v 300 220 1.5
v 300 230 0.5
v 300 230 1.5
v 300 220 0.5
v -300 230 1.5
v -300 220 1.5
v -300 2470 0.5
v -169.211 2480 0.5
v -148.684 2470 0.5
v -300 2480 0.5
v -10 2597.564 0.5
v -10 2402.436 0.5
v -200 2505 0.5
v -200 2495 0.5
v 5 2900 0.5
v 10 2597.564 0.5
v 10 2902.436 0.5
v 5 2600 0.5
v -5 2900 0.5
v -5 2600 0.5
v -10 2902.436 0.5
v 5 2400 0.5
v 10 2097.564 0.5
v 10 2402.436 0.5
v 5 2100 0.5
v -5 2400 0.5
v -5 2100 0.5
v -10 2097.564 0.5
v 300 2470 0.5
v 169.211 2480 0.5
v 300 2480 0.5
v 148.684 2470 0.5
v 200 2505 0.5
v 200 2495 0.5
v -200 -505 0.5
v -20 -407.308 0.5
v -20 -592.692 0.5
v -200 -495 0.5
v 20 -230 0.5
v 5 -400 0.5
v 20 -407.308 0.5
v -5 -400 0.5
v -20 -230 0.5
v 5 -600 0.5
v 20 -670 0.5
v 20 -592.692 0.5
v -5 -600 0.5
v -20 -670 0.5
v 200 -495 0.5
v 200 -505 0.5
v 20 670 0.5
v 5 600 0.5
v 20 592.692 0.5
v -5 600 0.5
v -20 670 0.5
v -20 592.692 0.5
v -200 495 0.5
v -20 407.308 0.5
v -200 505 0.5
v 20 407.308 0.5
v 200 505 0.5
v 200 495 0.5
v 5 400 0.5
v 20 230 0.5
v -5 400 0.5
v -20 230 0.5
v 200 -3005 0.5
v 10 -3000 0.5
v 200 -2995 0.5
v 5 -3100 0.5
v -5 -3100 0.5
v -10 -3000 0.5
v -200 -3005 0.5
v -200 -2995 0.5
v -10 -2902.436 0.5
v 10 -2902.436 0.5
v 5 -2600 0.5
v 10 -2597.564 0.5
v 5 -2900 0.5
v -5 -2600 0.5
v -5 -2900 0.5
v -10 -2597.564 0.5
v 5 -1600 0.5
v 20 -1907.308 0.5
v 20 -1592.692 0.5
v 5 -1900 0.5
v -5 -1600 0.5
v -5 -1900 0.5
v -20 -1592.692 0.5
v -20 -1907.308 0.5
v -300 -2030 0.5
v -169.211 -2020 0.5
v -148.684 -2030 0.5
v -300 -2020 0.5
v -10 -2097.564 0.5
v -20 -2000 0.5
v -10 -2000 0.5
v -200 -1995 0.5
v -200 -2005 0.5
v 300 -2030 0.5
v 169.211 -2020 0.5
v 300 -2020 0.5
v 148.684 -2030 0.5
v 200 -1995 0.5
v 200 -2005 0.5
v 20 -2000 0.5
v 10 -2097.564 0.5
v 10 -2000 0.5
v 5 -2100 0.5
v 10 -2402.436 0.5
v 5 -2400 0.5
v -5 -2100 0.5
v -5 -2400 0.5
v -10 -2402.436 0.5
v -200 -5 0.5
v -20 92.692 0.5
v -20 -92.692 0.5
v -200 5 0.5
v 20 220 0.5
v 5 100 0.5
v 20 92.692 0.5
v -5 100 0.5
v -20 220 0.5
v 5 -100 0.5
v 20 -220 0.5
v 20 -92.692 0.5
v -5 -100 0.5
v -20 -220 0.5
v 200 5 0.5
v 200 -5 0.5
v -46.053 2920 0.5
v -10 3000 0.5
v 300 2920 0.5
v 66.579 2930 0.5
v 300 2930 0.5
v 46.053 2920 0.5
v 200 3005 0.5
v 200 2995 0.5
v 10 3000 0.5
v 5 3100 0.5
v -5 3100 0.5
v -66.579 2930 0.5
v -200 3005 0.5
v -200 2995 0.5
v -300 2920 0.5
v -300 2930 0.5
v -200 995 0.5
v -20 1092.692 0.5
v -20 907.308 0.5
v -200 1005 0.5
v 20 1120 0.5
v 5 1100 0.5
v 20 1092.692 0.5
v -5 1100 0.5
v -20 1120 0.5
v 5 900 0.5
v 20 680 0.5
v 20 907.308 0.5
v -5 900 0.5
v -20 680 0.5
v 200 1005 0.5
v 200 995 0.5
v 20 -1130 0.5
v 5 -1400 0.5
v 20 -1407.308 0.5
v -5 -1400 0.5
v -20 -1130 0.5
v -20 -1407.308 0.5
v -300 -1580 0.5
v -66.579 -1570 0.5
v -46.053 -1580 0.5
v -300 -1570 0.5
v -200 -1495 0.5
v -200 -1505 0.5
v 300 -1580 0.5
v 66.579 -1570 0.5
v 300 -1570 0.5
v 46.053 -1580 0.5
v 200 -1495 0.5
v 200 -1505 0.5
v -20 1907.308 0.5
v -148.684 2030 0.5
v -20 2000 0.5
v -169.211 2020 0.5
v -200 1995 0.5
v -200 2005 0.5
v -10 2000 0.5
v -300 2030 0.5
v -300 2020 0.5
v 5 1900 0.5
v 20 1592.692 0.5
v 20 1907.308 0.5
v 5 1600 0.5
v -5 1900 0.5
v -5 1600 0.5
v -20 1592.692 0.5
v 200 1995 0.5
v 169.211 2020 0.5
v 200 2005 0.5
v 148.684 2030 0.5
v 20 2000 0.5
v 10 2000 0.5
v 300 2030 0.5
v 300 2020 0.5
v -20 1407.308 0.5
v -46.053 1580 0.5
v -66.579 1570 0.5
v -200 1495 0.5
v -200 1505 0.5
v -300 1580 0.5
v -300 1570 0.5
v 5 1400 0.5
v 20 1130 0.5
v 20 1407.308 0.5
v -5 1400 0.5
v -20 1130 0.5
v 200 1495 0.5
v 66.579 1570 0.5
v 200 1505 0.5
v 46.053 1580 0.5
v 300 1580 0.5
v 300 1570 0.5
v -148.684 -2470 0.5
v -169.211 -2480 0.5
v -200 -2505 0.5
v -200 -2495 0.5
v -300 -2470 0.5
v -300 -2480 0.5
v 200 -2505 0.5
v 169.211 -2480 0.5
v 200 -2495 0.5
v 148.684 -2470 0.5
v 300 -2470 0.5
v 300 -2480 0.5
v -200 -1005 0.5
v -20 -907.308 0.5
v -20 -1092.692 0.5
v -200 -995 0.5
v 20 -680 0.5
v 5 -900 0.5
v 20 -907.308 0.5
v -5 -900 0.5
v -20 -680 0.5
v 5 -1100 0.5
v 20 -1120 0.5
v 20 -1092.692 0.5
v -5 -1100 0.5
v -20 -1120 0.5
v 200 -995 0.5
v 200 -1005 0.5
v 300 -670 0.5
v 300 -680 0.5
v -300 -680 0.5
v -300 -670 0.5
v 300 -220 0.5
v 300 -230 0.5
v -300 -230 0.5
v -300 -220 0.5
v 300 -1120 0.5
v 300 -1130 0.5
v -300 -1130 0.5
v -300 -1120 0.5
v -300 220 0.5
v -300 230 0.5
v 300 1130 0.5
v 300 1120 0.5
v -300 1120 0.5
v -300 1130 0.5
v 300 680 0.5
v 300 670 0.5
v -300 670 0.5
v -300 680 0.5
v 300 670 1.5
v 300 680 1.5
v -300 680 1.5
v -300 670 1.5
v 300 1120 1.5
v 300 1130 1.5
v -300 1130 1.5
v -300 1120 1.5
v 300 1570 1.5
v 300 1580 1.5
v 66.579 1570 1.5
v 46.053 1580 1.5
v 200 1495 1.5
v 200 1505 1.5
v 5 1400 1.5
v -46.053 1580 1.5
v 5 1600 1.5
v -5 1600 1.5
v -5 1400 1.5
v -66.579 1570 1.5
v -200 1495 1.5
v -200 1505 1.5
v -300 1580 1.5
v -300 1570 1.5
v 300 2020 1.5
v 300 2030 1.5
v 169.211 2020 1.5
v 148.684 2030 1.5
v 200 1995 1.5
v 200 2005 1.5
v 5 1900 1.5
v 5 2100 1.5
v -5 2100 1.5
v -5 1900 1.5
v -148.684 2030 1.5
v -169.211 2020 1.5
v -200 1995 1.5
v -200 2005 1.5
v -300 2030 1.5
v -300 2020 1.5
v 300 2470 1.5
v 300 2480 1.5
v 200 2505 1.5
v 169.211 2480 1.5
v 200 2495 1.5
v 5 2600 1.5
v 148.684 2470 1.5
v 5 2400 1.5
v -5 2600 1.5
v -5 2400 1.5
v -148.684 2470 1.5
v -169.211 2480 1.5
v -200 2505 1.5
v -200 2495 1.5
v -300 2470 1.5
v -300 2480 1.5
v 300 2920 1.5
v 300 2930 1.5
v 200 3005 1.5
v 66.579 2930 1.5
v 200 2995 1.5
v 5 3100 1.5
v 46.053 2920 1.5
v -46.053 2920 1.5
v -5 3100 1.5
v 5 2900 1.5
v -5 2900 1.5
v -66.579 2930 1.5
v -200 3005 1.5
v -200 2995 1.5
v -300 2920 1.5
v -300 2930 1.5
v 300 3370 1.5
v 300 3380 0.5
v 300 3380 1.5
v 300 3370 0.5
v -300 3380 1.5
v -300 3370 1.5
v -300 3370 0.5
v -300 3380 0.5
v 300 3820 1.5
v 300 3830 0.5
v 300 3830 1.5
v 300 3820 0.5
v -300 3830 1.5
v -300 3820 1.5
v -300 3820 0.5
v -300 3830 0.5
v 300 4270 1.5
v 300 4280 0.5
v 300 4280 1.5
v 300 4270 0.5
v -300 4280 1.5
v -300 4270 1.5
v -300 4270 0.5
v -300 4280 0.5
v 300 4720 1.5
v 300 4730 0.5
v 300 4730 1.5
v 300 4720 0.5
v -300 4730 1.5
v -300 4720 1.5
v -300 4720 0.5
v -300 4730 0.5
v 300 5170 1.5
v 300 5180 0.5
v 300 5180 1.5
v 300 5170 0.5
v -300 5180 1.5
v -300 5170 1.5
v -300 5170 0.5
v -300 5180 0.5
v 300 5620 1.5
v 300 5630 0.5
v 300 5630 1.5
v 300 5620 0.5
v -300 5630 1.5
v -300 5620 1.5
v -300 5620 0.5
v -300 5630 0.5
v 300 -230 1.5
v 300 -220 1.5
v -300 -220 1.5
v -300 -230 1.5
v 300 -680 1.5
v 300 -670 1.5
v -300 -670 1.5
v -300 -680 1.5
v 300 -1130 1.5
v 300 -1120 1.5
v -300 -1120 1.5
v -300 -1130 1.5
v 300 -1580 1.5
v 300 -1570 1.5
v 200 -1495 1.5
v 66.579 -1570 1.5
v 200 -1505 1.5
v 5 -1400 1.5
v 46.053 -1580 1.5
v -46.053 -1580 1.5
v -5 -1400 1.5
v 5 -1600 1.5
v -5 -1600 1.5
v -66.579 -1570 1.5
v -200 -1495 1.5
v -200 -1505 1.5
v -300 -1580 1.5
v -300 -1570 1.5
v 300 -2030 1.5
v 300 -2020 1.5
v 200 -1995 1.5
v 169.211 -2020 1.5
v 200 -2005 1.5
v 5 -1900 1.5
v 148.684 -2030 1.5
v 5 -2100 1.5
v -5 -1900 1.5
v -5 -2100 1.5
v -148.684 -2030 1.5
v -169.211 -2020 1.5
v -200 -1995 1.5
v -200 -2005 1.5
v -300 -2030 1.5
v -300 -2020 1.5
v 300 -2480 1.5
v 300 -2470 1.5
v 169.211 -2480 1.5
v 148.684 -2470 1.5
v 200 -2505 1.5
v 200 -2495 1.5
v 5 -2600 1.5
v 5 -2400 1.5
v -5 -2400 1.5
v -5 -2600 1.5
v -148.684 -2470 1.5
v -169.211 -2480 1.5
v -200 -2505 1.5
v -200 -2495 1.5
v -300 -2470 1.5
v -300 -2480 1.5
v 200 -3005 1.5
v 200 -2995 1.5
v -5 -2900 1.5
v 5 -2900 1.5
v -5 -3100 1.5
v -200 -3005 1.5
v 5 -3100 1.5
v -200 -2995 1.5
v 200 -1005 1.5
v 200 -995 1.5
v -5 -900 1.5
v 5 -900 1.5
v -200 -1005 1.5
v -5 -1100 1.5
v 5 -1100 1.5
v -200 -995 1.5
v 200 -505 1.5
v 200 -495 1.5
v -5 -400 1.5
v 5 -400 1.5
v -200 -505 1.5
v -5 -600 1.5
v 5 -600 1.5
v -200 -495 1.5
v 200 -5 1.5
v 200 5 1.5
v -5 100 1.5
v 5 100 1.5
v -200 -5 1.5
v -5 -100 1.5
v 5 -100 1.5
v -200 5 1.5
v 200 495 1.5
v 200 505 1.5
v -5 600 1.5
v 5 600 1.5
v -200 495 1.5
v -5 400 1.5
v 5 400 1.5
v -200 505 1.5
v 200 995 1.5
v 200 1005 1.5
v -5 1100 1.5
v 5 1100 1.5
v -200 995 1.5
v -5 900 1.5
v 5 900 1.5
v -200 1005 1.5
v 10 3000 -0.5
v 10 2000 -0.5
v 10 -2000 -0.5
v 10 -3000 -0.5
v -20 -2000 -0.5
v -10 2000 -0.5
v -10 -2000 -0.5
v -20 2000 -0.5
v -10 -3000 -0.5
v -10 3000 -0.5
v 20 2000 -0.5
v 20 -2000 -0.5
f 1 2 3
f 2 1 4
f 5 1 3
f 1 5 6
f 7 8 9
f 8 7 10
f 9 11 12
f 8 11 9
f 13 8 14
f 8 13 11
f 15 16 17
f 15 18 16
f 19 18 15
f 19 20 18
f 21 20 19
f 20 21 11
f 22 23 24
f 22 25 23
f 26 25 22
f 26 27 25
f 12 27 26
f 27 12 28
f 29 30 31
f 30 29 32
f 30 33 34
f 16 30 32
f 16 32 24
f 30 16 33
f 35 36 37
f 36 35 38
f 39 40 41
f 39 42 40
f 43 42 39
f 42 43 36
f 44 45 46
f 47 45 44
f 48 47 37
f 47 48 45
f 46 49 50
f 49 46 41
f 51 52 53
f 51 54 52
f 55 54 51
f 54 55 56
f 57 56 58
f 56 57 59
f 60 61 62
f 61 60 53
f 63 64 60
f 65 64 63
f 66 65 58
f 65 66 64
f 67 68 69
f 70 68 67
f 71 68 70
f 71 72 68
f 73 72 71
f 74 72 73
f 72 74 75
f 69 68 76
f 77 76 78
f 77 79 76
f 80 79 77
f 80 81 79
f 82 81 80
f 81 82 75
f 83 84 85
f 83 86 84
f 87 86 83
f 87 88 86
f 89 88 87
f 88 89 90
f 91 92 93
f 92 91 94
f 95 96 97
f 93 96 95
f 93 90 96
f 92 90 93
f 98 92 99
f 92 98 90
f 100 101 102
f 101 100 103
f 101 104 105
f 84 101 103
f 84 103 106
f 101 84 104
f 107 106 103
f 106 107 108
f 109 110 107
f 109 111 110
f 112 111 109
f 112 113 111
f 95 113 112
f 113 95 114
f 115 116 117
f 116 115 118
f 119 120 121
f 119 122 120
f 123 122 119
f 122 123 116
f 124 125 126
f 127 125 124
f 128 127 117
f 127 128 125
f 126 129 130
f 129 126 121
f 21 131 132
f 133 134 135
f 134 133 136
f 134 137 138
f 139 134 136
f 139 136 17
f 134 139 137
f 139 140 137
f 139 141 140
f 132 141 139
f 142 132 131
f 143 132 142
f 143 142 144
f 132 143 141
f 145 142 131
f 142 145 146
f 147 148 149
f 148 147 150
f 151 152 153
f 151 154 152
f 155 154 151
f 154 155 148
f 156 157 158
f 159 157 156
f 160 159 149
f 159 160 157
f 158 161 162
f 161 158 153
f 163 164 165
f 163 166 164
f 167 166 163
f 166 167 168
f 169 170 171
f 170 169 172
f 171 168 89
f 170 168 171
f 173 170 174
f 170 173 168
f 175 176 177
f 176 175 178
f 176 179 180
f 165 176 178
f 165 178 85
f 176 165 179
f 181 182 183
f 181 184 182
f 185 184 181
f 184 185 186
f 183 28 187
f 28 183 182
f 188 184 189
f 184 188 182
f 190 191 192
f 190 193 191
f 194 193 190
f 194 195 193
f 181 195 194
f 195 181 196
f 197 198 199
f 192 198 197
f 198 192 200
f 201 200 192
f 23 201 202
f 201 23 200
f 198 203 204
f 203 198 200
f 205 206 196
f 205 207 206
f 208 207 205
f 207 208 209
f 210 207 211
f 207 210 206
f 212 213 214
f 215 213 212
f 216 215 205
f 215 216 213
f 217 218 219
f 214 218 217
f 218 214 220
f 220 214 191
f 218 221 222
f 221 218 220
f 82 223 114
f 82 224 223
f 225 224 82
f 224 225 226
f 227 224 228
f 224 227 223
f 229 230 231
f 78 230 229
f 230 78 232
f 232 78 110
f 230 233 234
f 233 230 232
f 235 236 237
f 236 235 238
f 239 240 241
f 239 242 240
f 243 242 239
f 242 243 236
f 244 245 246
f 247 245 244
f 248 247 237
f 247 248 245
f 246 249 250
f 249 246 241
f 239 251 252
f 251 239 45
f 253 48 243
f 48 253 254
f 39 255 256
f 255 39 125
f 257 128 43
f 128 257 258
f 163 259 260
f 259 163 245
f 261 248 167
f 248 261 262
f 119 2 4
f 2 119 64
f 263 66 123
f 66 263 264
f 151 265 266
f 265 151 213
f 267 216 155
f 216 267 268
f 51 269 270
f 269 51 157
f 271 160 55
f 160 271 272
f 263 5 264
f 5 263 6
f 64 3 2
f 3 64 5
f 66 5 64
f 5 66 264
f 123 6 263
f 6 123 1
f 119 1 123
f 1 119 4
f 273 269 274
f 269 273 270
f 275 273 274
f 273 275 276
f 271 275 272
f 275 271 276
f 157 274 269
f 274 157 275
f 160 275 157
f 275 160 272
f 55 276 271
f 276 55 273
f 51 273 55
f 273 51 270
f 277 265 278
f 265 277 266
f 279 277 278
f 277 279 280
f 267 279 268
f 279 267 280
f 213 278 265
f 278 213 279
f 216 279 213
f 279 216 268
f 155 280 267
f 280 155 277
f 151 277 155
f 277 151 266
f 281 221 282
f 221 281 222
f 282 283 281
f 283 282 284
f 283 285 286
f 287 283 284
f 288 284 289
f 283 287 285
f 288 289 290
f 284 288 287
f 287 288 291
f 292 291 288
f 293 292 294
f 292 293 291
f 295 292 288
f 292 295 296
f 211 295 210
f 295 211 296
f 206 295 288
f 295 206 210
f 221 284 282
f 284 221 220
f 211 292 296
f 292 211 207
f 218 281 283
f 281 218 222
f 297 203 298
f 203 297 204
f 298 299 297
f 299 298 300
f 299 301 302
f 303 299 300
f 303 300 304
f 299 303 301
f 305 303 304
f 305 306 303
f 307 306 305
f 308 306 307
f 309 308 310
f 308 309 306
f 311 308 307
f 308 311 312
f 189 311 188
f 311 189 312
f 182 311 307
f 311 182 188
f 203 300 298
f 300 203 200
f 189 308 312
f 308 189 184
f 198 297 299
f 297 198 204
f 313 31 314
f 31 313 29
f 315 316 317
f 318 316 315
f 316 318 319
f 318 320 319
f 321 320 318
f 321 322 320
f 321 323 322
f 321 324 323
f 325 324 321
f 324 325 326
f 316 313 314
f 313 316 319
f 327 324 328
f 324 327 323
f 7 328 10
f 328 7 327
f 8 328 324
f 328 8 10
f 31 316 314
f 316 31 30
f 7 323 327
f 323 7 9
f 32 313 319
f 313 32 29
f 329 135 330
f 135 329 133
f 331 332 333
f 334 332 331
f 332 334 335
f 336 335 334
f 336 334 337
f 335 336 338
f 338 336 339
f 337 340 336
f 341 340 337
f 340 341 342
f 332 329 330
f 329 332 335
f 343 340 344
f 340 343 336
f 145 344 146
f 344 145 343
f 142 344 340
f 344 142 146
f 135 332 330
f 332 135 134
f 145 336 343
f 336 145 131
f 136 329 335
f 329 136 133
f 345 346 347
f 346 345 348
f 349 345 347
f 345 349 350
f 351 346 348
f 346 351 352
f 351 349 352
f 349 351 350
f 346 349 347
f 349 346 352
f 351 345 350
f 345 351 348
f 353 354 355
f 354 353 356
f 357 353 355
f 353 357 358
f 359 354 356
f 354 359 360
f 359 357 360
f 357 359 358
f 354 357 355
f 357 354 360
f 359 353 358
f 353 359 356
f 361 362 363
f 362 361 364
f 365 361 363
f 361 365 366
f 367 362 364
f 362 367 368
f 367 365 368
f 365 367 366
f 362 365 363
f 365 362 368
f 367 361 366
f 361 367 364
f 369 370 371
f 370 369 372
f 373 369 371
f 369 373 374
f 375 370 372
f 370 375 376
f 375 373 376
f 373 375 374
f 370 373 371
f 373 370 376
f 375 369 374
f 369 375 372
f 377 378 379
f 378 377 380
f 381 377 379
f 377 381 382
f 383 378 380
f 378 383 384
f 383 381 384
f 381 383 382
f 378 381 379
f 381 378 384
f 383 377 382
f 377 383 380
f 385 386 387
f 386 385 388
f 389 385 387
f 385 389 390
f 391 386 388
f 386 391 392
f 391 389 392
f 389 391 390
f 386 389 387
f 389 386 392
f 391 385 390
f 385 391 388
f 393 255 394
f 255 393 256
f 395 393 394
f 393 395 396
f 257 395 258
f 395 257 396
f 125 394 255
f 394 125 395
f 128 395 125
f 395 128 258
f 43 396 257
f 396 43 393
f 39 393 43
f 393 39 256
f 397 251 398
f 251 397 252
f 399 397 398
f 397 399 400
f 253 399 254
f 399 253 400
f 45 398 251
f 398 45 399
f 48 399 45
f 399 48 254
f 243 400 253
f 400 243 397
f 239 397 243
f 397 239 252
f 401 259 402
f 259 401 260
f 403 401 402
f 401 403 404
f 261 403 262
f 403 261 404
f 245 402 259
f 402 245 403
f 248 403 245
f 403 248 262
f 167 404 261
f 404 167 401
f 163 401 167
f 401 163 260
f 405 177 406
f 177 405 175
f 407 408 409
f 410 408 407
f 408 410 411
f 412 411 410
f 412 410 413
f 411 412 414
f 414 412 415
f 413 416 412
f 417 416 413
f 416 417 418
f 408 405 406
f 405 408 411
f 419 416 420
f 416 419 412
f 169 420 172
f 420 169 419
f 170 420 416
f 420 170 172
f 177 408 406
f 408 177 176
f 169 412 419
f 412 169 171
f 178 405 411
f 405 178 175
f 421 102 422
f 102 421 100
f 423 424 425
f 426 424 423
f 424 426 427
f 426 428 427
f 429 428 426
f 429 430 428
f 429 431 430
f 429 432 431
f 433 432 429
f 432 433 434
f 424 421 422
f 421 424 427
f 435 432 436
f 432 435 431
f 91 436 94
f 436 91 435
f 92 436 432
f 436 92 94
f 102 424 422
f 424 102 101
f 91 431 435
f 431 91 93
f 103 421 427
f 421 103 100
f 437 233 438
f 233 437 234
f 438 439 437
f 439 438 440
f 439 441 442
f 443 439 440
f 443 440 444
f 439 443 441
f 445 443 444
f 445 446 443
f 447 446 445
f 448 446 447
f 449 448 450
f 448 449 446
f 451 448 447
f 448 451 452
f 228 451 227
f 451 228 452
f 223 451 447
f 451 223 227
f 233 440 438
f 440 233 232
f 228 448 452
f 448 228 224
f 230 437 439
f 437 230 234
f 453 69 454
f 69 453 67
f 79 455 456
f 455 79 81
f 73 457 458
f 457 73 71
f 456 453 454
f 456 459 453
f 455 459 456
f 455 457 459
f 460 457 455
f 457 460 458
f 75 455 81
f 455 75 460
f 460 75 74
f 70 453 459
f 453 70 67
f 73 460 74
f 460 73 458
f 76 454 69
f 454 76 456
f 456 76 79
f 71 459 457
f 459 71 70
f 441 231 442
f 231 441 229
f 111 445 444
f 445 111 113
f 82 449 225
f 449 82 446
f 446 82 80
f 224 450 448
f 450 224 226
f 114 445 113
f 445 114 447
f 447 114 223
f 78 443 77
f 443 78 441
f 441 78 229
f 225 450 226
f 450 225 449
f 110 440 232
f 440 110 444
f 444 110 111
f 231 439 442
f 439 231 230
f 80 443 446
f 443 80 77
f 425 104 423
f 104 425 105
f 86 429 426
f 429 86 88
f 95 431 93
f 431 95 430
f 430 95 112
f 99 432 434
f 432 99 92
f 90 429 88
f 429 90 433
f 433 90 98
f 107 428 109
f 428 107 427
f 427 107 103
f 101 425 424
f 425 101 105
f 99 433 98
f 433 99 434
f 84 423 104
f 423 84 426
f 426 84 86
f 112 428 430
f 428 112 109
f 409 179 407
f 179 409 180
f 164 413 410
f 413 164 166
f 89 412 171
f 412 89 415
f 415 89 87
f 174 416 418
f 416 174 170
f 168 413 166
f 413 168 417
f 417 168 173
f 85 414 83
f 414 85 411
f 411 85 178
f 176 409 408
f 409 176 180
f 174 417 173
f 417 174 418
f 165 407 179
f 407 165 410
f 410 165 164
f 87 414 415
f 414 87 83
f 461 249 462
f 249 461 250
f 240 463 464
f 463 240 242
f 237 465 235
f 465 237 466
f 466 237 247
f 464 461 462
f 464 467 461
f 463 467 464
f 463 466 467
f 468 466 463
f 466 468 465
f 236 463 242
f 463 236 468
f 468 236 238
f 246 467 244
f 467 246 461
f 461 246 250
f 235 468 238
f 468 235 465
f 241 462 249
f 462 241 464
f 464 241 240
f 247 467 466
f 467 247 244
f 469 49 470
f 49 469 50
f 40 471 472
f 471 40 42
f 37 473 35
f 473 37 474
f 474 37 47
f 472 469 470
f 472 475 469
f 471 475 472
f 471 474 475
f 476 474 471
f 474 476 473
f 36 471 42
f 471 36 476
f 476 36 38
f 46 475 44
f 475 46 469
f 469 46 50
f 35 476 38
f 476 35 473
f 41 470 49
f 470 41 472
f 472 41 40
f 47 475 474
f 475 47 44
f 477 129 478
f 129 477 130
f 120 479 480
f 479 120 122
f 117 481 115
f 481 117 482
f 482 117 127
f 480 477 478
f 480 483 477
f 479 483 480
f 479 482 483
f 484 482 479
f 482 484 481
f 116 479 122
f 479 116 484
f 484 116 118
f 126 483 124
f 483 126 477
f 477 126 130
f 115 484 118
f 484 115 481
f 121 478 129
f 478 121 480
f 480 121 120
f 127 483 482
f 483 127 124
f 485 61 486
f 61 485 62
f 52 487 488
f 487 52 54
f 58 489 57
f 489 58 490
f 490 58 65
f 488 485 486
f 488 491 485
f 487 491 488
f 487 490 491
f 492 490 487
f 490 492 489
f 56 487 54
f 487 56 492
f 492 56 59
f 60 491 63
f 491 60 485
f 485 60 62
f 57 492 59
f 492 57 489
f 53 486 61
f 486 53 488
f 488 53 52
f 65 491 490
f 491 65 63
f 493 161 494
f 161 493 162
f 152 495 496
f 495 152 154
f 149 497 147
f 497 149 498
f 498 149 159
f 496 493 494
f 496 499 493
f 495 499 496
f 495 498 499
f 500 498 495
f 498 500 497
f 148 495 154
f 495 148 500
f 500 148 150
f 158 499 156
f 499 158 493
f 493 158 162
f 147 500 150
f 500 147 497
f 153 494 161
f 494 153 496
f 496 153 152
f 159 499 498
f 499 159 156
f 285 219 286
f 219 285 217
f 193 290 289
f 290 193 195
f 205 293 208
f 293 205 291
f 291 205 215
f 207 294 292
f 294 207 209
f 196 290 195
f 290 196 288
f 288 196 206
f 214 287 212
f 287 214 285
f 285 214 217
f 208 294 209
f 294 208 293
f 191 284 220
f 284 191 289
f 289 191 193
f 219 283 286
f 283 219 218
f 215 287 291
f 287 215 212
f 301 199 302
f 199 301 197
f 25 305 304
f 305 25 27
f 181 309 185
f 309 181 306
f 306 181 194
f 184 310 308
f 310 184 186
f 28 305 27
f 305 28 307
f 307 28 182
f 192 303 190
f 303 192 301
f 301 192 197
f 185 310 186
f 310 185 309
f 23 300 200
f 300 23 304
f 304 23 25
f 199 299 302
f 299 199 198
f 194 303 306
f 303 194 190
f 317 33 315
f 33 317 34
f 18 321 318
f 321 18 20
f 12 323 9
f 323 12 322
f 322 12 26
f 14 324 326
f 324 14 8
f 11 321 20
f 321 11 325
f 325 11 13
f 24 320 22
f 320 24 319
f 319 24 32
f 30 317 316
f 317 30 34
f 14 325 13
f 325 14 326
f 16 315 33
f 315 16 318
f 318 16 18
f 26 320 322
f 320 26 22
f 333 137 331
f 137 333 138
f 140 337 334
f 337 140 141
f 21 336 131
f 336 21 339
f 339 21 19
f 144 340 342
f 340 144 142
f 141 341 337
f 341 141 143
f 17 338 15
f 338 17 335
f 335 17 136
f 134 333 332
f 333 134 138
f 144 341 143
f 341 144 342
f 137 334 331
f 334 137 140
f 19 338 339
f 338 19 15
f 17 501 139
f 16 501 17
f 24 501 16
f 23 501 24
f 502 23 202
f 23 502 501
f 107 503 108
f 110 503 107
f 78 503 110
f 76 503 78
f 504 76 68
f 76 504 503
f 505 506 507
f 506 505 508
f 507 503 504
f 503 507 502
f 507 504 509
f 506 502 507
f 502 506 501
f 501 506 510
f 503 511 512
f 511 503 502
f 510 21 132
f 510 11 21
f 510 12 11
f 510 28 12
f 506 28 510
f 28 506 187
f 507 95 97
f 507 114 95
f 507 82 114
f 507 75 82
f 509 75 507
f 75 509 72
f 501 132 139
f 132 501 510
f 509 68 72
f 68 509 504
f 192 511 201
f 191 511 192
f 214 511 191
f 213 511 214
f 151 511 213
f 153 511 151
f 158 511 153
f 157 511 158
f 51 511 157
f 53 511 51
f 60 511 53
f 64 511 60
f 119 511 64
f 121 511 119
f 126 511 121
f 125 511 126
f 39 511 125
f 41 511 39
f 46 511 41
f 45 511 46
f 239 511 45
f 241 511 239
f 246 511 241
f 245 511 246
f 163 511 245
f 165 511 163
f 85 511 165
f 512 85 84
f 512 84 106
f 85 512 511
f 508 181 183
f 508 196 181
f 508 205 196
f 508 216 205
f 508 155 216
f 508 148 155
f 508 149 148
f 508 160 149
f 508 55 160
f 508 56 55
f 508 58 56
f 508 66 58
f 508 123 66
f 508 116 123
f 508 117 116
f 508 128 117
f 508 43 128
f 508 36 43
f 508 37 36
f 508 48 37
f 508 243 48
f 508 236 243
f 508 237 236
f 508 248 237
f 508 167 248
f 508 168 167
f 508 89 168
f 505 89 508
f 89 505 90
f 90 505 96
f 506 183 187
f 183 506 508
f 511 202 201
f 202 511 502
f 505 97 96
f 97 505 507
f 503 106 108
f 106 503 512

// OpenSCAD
$fs=$fs/4;
$fa=$fa/4;


cube([20,6000,1], center = true);

cube([40,4000,1], center = true);

voie = true;
bineuse12 = true;

rayon15 = 40;
rayon45 = 12;
rayon50 = 13;
rayon75 = 0;
rayon80 = 0;
rayon60 = 0;


ceuilleur50 = 0;
ceuilleur60 = 0;

inter = 450;

if(rayon45){
    for(i=[0:12]){
        translate([0,i*450+inter/2,1]) color("green") cube([600,10,1], center = true);
    }
    for(i=[0:5]){
        translate([0,-i*450-inter/2,1]) color("green") cube([600,10,1], center = true);
    }
}

if(rayon50){
    for(i=[1:rayon50]){
        translate([0,(i-(rayon45)/2-1)*500,1]) color("green") 
        hull(){
            cube([400,10,1], center = true);
            cube([10,200,1], center = true);
        }
    }
}
